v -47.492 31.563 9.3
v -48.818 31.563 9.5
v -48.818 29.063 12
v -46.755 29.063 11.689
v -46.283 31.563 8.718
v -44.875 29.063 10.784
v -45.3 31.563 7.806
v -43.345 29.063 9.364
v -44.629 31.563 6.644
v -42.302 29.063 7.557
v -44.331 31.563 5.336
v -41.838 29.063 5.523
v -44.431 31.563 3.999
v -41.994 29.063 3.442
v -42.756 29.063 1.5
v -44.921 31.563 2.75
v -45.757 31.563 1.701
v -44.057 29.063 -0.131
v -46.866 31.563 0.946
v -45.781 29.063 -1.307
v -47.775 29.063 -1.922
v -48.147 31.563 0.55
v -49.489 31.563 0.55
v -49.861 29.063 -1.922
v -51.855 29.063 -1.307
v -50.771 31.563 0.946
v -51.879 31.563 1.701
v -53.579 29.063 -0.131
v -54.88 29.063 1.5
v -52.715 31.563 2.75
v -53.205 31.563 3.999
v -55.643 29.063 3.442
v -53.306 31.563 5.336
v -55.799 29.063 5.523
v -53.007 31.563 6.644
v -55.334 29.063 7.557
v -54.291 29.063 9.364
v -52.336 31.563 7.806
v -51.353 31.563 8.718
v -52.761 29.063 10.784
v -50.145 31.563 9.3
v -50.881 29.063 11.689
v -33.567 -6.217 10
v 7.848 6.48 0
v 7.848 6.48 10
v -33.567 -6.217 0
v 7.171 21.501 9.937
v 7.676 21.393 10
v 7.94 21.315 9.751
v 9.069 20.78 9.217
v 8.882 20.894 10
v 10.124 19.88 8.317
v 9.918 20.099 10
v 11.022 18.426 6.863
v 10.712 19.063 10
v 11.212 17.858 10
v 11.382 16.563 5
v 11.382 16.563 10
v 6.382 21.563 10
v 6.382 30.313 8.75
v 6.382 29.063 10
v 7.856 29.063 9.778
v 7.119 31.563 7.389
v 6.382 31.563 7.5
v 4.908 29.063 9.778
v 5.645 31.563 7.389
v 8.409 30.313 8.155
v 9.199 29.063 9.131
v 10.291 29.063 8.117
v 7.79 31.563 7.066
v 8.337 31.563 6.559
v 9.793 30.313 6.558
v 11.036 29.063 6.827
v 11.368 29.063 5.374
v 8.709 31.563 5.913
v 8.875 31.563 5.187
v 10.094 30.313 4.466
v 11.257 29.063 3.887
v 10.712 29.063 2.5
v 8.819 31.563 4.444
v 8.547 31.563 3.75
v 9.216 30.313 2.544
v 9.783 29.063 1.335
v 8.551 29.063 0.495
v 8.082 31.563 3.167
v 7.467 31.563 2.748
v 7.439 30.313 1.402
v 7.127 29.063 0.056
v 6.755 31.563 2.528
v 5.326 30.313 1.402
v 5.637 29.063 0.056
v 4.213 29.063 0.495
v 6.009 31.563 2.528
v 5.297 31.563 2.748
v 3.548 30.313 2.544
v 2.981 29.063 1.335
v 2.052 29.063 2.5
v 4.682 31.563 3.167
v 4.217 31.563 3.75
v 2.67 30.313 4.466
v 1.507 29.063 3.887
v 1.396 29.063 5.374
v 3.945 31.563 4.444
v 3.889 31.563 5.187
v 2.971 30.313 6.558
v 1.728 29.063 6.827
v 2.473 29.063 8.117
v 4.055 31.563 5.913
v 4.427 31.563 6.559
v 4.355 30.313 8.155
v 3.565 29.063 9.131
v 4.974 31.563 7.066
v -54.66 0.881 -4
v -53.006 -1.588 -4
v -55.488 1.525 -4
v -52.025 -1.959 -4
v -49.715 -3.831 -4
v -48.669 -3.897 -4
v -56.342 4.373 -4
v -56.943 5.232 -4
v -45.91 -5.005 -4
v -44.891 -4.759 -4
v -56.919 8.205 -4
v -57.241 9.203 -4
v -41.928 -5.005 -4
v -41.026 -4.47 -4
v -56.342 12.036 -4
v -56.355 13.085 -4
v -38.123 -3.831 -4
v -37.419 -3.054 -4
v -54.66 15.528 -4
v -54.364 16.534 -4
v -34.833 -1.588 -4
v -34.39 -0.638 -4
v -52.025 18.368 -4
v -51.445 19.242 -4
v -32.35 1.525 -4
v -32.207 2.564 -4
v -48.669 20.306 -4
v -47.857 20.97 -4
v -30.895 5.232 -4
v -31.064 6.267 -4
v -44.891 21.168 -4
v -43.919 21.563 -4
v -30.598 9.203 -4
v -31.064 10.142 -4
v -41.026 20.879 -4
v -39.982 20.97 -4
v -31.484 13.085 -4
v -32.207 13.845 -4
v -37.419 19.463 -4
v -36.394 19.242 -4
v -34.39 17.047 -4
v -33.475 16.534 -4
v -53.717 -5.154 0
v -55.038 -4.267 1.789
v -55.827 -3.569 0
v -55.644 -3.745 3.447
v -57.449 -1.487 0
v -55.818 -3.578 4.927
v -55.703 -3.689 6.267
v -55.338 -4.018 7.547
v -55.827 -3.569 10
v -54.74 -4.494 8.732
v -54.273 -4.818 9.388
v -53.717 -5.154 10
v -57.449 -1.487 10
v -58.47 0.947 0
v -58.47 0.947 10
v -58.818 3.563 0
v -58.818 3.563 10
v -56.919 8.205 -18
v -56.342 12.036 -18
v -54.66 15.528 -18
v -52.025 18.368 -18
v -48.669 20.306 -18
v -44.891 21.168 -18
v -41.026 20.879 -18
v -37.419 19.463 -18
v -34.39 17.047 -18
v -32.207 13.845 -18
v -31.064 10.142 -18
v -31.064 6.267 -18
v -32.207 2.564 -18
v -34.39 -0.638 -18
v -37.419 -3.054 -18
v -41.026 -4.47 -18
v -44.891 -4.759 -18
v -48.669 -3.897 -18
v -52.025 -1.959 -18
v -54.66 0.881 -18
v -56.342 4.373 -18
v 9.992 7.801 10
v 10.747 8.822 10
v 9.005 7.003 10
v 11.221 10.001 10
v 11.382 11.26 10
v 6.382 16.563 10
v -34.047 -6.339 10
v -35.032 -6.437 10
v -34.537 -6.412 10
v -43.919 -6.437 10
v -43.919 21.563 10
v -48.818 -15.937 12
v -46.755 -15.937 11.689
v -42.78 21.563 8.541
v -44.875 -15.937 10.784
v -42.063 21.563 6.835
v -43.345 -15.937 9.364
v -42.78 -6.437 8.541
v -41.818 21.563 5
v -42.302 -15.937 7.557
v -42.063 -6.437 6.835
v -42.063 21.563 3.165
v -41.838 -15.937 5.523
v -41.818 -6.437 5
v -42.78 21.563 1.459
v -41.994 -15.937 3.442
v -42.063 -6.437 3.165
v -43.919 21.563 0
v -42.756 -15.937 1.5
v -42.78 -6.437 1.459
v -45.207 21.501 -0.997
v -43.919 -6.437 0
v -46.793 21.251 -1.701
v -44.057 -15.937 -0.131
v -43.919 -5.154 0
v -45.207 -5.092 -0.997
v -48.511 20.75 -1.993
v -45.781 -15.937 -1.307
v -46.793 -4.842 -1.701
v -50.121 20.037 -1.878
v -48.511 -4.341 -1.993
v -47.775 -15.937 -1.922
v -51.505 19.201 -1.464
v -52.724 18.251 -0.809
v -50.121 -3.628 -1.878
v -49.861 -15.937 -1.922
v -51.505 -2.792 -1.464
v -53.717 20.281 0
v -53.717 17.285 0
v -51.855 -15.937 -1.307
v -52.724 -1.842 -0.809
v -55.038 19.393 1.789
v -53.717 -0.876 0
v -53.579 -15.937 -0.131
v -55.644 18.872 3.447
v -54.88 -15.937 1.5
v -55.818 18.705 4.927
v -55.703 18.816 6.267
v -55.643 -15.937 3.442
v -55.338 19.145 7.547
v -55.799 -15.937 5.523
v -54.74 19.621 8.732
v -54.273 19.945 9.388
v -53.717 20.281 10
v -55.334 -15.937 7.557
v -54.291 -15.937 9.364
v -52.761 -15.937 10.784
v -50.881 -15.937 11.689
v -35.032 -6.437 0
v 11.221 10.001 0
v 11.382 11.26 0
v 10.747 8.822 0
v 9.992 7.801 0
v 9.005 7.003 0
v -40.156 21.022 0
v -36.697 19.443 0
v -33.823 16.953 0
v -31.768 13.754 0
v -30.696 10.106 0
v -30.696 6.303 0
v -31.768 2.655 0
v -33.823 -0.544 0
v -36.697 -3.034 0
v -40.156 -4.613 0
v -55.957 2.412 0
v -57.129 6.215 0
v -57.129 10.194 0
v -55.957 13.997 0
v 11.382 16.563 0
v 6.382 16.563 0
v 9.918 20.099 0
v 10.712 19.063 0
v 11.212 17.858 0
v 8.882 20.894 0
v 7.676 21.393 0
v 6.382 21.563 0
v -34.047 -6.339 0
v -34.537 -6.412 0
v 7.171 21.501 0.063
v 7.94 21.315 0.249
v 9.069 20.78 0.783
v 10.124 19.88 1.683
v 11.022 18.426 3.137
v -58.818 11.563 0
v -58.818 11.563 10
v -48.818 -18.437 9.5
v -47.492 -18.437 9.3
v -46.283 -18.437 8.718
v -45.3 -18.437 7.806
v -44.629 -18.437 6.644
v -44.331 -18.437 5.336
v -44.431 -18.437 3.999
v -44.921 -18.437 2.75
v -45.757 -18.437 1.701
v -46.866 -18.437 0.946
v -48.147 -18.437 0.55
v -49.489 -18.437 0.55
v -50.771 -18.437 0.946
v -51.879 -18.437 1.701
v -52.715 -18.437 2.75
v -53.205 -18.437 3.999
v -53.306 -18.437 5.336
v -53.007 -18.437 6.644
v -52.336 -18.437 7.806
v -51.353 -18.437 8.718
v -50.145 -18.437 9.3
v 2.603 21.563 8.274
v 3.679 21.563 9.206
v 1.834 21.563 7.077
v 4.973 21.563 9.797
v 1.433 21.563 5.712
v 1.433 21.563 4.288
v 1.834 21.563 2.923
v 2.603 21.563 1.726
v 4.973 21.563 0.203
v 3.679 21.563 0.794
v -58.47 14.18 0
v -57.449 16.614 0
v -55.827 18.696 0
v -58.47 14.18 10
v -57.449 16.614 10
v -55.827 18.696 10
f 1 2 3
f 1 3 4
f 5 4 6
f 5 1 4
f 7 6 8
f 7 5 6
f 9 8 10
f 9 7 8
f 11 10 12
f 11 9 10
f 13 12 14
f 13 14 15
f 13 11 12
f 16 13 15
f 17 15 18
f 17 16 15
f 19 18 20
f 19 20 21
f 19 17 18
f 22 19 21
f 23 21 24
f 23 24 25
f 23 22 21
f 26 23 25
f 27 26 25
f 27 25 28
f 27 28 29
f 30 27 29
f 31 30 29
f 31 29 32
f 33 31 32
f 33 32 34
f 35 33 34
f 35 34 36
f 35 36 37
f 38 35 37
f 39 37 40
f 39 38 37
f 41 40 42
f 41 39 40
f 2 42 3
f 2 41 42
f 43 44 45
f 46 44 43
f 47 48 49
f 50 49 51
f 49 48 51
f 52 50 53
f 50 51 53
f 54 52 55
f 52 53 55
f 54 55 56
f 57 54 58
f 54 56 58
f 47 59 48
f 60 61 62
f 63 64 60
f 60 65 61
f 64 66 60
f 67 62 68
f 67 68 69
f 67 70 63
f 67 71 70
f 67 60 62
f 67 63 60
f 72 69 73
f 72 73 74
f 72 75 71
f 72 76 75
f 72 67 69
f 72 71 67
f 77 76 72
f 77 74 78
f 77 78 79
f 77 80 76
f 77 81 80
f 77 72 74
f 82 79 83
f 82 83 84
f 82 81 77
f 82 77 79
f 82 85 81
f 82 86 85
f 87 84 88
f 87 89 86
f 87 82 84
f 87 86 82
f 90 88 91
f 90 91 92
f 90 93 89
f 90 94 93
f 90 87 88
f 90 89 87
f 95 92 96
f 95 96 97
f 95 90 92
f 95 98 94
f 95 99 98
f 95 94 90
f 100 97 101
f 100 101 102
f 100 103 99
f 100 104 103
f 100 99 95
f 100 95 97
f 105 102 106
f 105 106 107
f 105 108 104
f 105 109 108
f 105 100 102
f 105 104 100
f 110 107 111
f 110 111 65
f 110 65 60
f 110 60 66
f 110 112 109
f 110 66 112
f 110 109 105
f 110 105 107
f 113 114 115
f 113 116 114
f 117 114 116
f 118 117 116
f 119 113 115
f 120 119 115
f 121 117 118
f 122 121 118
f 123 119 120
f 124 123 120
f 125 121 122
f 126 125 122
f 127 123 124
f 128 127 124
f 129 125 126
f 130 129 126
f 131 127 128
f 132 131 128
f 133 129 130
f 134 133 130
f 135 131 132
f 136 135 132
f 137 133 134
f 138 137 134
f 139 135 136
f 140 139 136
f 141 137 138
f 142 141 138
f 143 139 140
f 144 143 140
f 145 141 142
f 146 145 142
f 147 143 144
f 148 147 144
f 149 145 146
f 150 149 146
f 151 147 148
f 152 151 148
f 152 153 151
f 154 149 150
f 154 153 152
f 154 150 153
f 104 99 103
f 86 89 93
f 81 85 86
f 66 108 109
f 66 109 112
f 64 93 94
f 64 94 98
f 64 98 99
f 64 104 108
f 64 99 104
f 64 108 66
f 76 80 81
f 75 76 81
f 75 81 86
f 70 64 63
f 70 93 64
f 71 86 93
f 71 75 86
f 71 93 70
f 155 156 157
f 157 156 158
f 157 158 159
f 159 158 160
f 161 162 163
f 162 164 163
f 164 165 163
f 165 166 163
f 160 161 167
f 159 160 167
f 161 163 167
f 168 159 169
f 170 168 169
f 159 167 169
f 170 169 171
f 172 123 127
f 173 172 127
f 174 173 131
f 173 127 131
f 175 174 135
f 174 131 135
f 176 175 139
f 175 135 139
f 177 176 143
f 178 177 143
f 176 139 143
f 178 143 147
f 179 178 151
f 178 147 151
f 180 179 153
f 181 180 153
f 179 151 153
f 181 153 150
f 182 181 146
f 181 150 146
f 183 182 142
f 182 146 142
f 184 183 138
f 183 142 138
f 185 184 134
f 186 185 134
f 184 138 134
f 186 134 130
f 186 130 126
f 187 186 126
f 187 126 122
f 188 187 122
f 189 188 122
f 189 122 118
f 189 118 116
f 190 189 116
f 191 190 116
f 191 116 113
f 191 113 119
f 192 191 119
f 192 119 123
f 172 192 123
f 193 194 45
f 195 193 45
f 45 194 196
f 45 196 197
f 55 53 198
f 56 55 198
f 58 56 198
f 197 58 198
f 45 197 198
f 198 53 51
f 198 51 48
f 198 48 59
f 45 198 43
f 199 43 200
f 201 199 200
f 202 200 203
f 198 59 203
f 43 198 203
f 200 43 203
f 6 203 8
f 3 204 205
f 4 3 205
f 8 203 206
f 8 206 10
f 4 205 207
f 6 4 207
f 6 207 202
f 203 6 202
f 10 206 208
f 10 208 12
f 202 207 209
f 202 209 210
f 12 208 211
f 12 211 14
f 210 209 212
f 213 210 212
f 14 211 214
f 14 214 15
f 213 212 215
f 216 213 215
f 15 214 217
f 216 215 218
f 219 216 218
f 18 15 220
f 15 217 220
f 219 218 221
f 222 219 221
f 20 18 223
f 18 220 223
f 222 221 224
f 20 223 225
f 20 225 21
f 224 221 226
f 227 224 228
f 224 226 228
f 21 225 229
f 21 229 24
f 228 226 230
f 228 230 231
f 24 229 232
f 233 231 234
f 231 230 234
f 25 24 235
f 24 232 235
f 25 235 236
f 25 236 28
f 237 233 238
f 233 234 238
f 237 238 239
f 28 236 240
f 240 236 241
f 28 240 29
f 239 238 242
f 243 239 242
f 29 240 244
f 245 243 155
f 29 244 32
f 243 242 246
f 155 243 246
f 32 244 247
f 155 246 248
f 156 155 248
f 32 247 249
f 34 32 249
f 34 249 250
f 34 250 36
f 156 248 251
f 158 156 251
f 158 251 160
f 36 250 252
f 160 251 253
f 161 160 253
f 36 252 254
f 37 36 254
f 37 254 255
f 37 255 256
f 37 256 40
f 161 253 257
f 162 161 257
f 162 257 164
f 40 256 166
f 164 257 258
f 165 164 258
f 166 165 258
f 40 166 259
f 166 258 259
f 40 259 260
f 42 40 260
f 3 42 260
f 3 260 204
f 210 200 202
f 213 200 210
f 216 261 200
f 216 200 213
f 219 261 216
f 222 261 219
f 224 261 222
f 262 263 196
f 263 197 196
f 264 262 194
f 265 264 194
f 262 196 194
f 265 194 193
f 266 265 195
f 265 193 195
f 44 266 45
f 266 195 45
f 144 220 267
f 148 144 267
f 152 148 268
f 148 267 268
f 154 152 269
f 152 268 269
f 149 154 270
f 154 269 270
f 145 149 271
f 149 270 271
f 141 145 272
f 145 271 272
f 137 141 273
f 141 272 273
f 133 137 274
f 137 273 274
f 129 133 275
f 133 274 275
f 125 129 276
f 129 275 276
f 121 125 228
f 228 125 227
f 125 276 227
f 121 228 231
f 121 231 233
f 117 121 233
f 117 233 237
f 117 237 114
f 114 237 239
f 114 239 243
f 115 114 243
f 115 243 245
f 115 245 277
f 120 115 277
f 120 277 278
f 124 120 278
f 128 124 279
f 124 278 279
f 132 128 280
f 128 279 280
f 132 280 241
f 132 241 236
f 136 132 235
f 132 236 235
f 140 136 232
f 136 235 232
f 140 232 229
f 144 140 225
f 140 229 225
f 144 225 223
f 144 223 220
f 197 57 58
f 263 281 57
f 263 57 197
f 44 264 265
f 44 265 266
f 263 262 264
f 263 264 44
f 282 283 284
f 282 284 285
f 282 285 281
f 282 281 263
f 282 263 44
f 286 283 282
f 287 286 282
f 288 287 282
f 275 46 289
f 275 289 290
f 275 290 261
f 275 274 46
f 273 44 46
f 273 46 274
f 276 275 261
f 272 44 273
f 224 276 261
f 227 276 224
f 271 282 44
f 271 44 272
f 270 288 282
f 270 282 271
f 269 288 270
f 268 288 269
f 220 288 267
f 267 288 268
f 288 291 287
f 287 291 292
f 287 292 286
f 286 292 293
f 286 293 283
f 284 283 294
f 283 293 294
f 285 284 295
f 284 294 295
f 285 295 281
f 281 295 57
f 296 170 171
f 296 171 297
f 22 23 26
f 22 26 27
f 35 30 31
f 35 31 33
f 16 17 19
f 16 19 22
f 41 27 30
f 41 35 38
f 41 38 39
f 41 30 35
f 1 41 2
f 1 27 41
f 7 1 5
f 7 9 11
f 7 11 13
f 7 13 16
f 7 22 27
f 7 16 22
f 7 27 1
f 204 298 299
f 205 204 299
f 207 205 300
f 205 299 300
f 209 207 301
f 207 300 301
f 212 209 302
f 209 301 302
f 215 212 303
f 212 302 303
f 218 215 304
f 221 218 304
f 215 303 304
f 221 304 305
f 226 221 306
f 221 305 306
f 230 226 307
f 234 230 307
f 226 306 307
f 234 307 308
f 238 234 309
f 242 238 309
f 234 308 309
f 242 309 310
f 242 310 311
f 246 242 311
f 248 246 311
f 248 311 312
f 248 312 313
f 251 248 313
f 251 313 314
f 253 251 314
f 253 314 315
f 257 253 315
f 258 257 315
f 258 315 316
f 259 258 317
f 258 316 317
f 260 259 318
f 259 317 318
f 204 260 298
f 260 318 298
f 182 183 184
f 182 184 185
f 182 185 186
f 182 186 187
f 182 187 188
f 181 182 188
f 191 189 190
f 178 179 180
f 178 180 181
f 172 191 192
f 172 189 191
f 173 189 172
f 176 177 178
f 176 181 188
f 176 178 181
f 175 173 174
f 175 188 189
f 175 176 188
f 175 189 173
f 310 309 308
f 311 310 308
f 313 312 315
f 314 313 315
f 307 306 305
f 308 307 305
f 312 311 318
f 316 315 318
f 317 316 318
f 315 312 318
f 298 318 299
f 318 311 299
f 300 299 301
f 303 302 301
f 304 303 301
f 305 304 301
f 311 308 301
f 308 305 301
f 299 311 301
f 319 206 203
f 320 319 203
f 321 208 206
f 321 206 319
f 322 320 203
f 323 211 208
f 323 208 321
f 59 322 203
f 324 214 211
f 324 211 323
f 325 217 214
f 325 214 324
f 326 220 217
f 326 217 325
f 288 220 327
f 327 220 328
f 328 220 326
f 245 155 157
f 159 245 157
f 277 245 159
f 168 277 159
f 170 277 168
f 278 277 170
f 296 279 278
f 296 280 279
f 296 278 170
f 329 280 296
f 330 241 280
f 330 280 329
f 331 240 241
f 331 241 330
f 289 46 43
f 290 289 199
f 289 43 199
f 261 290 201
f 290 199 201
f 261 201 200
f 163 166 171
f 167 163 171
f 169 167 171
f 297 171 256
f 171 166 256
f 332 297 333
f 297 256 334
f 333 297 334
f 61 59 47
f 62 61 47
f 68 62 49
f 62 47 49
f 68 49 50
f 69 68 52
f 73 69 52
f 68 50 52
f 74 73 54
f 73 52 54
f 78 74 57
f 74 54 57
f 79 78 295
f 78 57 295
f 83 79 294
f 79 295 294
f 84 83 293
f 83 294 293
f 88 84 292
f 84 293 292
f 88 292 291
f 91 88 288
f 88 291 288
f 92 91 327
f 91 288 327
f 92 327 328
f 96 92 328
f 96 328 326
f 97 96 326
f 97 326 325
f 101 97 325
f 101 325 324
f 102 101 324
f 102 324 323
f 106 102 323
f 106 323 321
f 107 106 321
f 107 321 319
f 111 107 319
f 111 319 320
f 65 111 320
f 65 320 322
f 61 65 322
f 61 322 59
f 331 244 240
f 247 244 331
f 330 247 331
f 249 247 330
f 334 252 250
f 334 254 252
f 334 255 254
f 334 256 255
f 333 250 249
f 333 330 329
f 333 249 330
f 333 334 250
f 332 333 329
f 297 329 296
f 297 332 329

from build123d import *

# Parameters (mm, degrees)
BOSS_EXTRUDE1_DEPTH      = 10
FILLET1_R                = 10
FILLET2_R                = 5
BOSS_EXTRUDE2_DEPTH      = 10
BOSS_EXTRUDE2_DEPTH_BACK = 40
SKETCH2_R                = 7
BOSS_EXTRUDE3_START      = -5
SKETCH3_R                = 5
BOSS_EXTRUDE3_DEPTH      = 15
CHAMFER1_SIZE            = 2.5
BOSS_EXTRUDE4_DEPTH      = 18
BOSS_EXTRUDE4_DEPTH_BACK = 10
SKETCH4_R                = 13
SKETCH5_R                = 13.358898944
BOSS_EXTRUDE5_DEPTH      = 4


with BuildPart() as part:
    # Sketch1 → Boss-Extrude1 (new body)
    with BuildSketch(Plane.XY):
        Polygon((-58.818184361, 21.563458262), (11.382033939, 21.563458262), (11.382033939, 7.563458262), (-34.282866194, -6.436541738), (-58.818184361, -6.436541738), align=None)
    extrude(amount=BOSS_EXTRUDE1_DEPTH)

    # Fillet1
    fillet1_edges = [part.edges().sort_by_distance(p)[0] for p in [
        (-58.818184361, 21.563458262, 5),
        (-58.818184361, -6.436541738, 5),
    ]]
    fillet(fillet1_edges, radius=FILLET1_R)

    # Fillet2
    fillet2_edges = [part.edges().sort_by_distance(p)[0] for p in [
        (11.382033939, 21.563458262, 5),
        (11.382033939, 7.563458262, 5),
        (-34.282866194, -6.436541738, 5),
    ]]
    fillet(fillet2_edges, radius=FILLET2_R)

    # Sketch2 → Boss-Extrude2 (add, two sides: drawn at the far end of the back side and taken through both)
    with BuildSketch(Plane(origin=(0, 21.563458262, 0), x_dir=(1, 0, 0), z_dir=(0, 1, 0)).offset(-BOSS_EXTRUDE2_DEPTH_BACK)):
        with Locations(Location((-48.818184361, -5, 0), (0, 0, 270))):
            Circle(SKETCH2_R)
    extrude(amount=BOSS_EXTRUDE2_DEPTH + BOSS_EXTRUDE2_DEPTH_BACK)

    # Sketch3 → Boss-Extrude3 (add)
    with BuildSketch(Plane(origin=(0, 21.563458262, 0), x_dir=(1, 0, 0), z_dir=(0, 1, 0)).offset(BOSS_EXTRUDE3_START)):
        with Locations(Location((6.382033939, -5, 0), (0, 0, 270))):
            Circle(SKETCH3_R)
    extrude(amount=BOSS_EXTRUDE3_DEPTH)

    # Chamfer1
    chamfer1_edges = [part.edges().sort_by_distance(p)[0] for p in [
        (-48.818184361, -18.436541738, -2),
        (-48.818184361, 31.563458262, -2),
        (6.382033939, 31.563458262, 0),
    ]]
    chamfer(chamfer1_edges, length=CHAMFER1_SIZE)

    # Sketch4 → Boss-Extrude4 (add, two sides: drawn at the far end of the back side and taken through both)
    with BuildSketch(Plane(origin=(0, 0, 0), x_dir=(-1, 0, 0), z_dir=(0, 0, -1)).offset(-BOSS_EXTRUDE4_DEPTH_BACK)):
        with Locations((43.919204876, 8.204559319)):
            Circle(SKETCH4_R)
    extrude(amount=BOSS_EXTRUDE4_DEPTH + BOSS_EXTRUDE4_DEPTH_BACK)

    # Sketch5 → Boss-Extrude5 (add)
    with BuildSketch(Plane(origin=(0, 0, 0), x_dir=(-1, 0, 0), z_dir=(0, 0, -1))):
        with Locations(Location((43.919204876, 8.204559319, 0), (0, 0, 90))):
            Circle(SKETCH5_R)
    extrude(amount=BOSS_EXTRUDE5_DEPTH)


solid = part.part
